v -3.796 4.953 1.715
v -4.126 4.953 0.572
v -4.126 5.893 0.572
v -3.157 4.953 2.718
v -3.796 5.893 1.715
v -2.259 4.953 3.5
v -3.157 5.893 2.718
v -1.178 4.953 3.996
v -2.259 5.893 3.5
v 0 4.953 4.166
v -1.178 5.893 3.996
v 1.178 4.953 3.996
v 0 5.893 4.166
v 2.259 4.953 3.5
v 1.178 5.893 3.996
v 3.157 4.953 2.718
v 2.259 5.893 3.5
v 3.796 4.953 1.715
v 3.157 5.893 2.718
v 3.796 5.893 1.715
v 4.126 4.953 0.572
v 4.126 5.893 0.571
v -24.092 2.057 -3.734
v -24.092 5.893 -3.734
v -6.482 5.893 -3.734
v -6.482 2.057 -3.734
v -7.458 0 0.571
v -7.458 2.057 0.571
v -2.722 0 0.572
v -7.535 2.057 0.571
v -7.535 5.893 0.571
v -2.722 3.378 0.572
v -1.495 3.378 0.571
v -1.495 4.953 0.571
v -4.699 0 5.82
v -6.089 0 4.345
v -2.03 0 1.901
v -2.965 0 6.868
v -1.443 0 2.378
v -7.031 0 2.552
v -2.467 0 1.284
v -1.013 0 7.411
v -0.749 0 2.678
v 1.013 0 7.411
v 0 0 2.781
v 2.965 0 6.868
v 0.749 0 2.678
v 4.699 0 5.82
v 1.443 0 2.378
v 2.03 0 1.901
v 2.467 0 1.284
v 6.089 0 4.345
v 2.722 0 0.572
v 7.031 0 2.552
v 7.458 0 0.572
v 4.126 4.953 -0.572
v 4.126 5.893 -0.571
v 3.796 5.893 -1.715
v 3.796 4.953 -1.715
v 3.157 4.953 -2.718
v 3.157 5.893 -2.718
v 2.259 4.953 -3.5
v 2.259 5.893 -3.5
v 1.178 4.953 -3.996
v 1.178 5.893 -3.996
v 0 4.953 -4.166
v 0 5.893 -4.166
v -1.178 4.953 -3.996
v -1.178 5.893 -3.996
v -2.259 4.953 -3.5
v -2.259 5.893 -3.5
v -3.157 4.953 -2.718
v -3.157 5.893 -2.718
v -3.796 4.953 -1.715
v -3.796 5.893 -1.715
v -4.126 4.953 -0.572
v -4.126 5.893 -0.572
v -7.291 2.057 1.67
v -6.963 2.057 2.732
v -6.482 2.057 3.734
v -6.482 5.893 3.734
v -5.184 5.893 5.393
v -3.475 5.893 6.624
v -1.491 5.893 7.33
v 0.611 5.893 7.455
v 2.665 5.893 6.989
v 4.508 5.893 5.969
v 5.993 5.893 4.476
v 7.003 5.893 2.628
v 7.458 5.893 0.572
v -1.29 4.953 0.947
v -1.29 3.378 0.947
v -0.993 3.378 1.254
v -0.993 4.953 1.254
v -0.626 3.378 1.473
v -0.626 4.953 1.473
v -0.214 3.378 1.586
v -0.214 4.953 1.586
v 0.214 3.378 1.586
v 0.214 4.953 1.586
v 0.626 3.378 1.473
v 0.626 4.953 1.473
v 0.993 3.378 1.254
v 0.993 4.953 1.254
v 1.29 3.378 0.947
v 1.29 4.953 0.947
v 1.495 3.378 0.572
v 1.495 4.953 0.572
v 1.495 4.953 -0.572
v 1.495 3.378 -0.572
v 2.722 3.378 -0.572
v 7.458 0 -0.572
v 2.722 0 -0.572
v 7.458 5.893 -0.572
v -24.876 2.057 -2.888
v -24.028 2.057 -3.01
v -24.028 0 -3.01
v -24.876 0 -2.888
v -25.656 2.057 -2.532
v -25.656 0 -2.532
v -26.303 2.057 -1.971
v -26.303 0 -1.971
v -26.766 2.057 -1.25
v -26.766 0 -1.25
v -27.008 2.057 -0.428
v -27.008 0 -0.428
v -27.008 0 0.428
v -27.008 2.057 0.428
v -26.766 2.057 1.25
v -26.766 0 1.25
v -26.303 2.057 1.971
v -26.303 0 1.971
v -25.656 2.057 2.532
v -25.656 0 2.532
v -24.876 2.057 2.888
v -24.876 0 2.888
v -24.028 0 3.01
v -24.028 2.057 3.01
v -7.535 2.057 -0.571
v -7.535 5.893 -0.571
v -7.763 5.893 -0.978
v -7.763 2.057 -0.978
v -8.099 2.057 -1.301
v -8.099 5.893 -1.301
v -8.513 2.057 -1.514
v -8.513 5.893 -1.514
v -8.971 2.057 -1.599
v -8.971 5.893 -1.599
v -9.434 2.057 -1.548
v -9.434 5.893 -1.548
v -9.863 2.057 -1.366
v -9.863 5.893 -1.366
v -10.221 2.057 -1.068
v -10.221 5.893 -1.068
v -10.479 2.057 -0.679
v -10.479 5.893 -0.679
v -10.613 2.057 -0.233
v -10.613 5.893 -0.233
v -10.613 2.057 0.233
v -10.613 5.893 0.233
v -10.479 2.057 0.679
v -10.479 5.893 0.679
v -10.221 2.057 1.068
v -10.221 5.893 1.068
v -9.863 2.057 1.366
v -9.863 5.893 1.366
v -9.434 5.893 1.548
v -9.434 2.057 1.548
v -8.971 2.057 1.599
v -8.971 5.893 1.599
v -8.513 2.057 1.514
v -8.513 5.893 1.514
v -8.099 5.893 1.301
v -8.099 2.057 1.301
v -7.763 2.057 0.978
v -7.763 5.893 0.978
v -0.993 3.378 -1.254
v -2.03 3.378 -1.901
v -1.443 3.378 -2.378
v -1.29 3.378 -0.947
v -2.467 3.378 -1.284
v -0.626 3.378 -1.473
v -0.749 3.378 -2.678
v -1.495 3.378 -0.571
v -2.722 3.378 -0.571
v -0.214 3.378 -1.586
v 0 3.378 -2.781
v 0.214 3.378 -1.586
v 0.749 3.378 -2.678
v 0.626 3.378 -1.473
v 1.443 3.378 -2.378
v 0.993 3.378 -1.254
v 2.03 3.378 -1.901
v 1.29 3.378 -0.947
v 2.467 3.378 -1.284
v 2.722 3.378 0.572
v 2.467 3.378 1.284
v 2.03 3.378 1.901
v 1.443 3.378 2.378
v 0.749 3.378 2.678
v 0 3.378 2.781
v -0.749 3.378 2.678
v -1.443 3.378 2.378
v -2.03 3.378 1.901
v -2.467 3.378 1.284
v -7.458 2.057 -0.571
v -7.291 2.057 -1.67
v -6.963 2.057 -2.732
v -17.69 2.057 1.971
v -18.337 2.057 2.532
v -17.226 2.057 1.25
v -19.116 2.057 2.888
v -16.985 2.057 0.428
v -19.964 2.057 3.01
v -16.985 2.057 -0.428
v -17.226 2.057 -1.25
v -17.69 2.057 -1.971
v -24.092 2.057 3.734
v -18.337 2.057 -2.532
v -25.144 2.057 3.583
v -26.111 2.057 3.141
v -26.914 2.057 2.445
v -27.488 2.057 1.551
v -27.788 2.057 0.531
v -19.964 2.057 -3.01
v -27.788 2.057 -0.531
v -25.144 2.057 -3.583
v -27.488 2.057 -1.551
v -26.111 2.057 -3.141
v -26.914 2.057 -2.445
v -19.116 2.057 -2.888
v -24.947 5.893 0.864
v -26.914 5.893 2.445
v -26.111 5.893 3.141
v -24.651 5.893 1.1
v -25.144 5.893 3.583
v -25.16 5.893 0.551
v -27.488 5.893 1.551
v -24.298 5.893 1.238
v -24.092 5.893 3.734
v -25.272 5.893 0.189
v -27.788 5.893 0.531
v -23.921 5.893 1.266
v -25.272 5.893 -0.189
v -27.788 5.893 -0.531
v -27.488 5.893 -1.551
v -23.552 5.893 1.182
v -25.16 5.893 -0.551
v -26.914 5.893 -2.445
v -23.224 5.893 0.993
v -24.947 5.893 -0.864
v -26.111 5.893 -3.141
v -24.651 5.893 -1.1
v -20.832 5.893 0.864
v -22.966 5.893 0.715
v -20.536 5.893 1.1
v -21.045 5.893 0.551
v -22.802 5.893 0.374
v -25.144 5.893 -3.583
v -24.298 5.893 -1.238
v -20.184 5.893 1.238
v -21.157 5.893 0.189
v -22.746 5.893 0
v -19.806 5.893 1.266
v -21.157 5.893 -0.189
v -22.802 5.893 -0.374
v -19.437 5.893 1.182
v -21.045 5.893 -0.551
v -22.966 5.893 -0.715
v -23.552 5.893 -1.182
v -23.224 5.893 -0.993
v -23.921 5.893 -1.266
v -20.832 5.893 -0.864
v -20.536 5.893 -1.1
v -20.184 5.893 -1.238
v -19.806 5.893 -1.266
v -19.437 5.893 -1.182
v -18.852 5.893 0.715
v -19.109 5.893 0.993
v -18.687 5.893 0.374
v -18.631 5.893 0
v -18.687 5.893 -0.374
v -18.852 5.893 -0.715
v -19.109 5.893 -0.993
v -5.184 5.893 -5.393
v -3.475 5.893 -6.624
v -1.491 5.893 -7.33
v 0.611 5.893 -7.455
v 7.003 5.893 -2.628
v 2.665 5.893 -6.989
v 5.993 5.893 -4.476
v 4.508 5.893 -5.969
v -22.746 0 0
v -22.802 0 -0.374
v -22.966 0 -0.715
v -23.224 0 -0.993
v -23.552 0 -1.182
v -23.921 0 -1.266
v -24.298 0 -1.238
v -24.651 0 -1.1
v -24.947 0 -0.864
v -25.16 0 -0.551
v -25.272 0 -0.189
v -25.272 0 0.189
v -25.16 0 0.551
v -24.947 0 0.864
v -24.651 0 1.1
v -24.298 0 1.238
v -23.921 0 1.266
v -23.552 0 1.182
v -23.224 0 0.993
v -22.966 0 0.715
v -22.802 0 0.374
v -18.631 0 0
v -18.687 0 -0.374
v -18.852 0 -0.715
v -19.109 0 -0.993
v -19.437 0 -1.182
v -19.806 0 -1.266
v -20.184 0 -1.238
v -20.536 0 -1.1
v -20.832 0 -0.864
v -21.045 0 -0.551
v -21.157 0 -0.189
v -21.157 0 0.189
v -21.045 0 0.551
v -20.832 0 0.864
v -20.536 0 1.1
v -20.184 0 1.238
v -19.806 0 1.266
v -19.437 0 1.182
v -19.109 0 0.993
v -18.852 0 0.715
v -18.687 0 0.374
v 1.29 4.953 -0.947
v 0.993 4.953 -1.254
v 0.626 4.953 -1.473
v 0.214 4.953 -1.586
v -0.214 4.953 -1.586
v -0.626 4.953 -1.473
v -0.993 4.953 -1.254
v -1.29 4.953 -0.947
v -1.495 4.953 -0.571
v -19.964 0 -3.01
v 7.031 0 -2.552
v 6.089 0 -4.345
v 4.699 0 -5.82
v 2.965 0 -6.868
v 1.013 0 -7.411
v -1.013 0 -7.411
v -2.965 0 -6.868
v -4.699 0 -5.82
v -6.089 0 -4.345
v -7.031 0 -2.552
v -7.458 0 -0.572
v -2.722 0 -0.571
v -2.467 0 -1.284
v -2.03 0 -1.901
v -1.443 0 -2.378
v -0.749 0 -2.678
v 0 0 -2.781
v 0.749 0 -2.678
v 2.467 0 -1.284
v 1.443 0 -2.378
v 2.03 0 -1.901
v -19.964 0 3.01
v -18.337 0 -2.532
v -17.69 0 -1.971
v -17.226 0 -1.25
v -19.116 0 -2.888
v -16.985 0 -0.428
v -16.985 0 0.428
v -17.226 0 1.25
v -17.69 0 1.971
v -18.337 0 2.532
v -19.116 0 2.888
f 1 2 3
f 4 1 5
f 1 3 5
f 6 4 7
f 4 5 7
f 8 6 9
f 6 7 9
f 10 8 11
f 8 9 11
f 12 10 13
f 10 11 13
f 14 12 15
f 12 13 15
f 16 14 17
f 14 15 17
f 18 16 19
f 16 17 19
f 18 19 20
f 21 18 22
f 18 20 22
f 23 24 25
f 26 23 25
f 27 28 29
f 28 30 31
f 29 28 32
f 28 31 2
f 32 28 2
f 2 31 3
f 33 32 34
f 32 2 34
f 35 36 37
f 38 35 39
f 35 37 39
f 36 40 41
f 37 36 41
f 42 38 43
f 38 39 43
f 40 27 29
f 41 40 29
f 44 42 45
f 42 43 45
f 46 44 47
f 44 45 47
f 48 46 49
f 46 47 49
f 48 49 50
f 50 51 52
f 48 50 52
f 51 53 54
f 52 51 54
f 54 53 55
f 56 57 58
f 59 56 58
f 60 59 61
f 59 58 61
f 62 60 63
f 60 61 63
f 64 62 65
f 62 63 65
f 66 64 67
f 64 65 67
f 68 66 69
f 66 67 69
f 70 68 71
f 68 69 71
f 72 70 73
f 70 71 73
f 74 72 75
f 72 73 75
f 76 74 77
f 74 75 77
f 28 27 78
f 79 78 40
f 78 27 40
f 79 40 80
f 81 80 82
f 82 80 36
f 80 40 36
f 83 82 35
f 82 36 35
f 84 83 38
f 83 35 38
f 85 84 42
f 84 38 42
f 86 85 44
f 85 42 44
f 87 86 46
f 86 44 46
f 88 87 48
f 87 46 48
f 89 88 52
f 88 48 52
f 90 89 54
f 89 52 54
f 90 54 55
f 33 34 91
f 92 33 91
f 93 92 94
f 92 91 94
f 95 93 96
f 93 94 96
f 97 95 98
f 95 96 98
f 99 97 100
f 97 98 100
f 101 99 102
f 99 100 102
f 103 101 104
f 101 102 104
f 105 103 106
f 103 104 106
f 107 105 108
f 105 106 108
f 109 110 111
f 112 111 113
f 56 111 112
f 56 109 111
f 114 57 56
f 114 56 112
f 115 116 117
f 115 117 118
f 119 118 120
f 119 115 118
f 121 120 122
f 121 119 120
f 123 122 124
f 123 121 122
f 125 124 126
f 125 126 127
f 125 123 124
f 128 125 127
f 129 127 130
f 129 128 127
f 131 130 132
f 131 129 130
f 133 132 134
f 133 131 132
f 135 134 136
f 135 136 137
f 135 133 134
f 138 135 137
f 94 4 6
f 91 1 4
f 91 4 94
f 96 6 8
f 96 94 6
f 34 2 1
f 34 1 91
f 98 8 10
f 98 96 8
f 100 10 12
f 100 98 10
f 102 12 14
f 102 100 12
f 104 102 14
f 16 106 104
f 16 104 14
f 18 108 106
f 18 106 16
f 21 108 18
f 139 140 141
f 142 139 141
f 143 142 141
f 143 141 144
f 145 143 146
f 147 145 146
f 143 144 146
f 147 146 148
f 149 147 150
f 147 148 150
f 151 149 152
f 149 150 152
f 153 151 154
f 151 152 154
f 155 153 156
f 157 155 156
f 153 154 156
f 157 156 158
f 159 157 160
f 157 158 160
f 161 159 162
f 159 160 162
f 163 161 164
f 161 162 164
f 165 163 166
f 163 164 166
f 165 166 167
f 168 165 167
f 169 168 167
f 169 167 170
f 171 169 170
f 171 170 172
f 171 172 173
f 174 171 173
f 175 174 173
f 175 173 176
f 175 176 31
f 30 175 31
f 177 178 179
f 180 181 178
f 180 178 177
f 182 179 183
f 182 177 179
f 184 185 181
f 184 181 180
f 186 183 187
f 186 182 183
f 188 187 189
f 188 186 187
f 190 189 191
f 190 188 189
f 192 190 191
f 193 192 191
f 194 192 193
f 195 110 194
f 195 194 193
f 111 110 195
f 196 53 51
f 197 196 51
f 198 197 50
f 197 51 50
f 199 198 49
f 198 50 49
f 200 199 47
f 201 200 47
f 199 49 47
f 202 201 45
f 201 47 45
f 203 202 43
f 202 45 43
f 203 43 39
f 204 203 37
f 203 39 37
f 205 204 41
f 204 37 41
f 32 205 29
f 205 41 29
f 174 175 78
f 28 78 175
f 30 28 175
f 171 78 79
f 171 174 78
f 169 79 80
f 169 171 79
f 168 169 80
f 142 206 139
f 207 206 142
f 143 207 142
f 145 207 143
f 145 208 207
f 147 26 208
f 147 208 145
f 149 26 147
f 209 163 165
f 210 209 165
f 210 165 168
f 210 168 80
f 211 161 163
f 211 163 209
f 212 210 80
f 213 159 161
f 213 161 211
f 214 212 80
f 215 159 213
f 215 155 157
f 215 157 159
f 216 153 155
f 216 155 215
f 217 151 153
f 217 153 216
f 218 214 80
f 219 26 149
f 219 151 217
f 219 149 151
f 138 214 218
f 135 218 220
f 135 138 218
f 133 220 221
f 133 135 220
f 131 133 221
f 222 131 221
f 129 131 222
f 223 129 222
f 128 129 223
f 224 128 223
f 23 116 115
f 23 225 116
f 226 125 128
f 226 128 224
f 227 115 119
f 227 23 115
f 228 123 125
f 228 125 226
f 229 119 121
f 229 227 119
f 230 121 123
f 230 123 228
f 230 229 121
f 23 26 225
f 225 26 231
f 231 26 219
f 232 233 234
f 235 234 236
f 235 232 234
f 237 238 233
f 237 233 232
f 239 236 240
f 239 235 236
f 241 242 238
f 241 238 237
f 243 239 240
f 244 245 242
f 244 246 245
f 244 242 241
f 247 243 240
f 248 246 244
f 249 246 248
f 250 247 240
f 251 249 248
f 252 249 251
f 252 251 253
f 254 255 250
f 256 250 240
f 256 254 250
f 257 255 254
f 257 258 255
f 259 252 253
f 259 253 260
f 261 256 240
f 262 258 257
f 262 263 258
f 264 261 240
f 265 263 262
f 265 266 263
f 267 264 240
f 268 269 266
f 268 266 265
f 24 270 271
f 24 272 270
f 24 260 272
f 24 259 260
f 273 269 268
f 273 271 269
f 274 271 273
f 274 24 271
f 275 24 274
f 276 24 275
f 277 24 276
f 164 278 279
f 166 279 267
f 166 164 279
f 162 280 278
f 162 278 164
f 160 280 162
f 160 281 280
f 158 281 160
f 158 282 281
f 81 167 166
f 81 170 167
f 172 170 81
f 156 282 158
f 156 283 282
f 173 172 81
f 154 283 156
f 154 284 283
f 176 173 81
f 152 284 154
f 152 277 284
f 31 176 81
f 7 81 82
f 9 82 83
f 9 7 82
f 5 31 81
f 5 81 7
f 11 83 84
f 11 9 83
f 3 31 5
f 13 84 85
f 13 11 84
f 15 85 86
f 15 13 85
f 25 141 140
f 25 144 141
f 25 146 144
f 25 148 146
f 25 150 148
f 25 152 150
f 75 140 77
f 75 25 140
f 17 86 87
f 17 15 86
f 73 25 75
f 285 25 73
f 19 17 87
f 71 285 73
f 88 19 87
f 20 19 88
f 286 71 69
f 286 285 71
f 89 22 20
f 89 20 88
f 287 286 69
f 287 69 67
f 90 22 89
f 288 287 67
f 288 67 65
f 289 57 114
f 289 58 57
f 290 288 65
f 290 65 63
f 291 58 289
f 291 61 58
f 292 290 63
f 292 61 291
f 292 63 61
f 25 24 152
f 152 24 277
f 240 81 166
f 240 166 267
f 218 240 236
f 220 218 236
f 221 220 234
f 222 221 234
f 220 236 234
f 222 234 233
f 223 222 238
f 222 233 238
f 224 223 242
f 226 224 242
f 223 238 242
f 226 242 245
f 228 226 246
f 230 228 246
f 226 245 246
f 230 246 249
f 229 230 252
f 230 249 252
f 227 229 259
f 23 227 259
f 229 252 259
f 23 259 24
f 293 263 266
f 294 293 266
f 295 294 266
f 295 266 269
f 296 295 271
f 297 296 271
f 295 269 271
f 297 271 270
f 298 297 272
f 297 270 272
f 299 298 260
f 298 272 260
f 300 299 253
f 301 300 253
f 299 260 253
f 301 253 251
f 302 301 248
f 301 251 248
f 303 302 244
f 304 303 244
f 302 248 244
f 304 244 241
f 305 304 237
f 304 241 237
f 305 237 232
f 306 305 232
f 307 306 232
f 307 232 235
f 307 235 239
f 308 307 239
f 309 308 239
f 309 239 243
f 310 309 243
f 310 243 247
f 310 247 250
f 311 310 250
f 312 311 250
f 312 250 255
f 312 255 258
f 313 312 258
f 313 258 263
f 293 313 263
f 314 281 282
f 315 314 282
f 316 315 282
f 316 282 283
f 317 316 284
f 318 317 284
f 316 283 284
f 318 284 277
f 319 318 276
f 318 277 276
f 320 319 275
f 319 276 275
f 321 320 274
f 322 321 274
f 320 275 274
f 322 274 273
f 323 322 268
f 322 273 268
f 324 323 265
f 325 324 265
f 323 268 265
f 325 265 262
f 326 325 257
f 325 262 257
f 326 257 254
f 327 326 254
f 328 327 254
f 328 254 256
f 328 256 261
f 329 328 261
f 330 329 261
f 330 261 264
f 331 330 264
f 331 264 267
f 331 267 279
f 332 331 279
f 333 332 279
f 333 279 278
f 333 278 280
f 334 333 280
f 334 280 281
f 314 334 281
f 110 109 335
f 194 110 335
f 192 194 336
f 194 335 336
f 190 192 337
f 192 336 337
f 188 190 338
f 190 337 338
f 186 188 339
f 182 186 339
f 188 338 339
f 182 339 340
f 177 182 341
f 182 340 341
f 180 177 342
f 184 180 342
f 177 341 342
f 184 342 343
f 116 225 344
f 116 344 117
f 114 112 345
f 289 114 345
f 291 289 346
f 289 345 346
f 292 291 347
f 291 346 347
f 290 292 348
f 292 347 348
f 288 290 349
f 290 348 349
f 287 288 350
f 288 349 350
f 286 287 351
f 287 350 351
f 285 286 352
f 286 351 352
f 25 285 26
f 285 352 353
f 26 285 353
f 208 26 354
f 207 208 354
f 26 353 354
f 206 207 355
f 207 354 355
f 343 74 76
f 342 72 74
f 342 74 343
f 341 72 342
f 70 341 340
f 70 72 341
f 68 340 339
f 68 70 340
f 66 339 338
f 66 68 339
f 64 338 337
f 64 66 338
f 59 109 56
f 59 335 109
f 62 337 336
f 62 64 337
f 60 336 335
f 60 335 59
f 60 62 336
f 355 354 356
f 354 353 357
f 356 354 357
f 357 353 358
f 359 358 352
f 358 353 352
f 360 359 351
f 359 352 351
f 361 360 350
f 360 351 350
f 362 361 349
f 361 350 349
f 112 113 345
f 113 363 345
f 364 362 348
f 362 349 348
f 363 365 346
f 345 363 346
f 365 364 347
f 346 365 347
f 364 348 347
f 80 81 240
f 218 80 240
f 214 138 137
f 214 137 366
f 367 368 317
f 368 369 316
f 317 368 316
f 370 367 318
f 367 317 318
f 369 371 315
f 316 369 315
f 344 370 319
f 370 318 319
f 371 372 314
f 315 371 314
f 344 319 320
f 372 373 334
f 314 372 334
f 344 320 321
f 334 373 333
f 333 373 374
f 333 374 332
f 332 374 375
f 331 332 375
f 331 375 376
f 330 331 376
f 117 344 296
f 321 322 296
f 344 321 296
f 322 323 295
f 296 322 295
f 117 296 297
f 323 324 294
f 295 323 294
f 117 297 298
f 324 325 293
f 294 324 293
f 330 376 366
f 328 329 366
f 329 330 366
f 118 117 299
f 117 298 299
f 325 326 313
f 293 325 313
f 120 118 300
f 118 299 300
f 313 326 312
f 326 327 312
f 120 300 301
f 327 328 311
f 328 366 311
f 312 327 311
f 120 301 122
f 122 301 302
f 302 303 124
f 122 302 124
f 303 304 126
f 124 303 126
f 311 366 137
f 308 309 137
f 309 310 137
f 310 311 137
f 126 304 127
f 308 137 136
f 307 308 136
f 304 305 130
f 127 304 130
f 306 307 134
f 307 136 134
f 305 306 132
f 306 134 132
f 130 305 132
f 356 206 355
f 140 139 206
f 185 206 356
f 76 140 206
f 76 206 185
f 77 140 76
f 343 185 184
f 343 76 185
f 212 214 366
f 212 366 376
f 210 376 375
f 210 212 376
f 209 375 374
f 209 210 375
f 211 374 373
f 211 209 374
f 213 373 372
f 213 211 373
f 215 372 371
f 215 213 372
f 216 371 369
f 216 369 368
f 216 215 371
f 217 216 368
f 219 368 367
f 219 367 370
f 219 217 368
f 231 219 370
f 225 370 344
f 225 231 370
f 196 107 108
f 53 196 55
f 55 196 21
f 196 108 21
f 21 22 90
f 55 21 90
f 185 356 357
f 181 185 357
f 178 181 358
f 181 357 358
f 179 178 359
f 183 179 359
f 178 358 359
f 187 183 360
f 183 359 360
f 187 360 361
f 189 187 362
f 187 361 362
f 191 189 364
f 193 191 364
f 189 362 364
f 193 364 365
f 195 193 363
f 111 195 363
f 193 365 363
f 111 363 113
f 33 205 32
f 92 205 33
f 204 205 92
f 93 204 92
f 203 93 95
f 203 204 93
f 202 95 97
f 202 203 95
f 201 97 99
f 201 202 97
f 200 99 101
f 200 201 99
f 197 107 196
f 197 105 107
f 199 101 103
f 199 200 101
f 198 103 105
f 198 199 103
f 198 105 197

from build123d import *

# Parameters (mm, degrees)
SKETCH1_R           = 7.4803
BOSS_EXTRUDE1_DEPTH = 5.8928
SKETCH2_R           = 2.7813
CUT_EXTRUDE1_DEPTH  = 3.3782
BOSS_EXTRUDE2_DEPTH = 3.8354
BOSS_EXTRUDE3_DEPTH = 2.0574
SKETCH6_R           = 4.1656
CUT_EXTRUDE2_DEPTH  = 0.9398
SKETCH7_R           = 1.6002
SKETCH7_R_2         = 1.27
SKETCH7_W           = 18.255027212
SKETCH7_H           = 1.143
CUT_EXTRUDE3_DEPTH  = 6.8928


with BuildPart() as part:
    # Sketch1 → Boss-Extrude1 (new body)
    with BuildSketch(Plane(origin=(0, 0, 0), x_dir=(1, 0, 0), z_dir=(0, 1, 0))):
        Circle(SKETCH1_R)
    extrude(amount=BOSS_EXTRUDE1_DEPTH)

    # Sketch2 → Cut-Extrude1 (cut)
    with BuildSketch(Plane.XZ):
        Circle(SKETCH2_R)
    extrude(amount=-CUT_EXTRUDE1_DEPTH, mode=Mode.SUBTRACT)

    # Sketch4 → Boss-Extrude2 (add)
    with BuildSketch(Plane(origin=(0, 5.8928, 0), x_dir=(1, 0, 0), z_dir=(0, 1, 0))):
        with BuildLine():
            Line((-24.0919, 3.7338), (-6.481791855, 3.7338))
            ThreePointArc((-6.481791855, 3.7338), (-7.4803, 0), (-6.481791855, -3.7338))
            Line((-6.481791855, -3.7338), (-24.0919, -3.7338))
            ThreePointArc((-24.0919, -3.7338), (-27.8257, 0), (-24.0919, 3.7338))
        make_face()
    extrude(amount=-BOSS_EXTRUDE2_DEPTH)

    # Sketch5 → Boss-Extrude3 (add)
    with BuildSketch(Plane.XZ.offset(-2.0574)):
        with BuildLine():
            Line((-24.0284, 3.0099), (-19.9644, 3.0099))
            ThreePointArc((-19.9644, 3.0099), (-16.9545, 0), (-19.9644, -3.0099))
            Line((-19.9644, -3.0099), (-24.0284, -3.0099))
            ThreePointArc((-24.0284, -3.0099), (-27.0383, 0), (-24.0284, 3.0099))
        make_face()
    extrude(amount=BOSS_EXTRUDE3_DEPTH)

    # Sketch6 → Cut-Extrude2 (cut)
    with BuildSketch(Plane(origin=(0, 5.8928, 0), x_dir=(1, 0, 0), z_dir=(0, 1, 0))):
        Circle(SKETCH6_R)
    extrude(amount=-CUT_EXTRUDE2_DEPTH, mode=Mode.SUBTRACT)

    # Sketch7 → Cut-Extrude3 (cut, through all)
    with BuildSketch(Plane(origin=(0, 5.8928, 0), x_dir=(1, 0, 0), z_dir=(0, 1, 0))):
        with Locations((-9.0297, 0)):
            Circle(SKETCH7_R)
        Circle(SKETCH7_R)
        with Locations((-24.0157, 0)):
            Circle(SKETCH7_R_2)
        with Locations((-19.9009, 0)):
            Circle(SKETCH7_R_2)
        with Locations((0.097813606, 0)):
            Rectangle(SKETCH7_W, SKETCH7_H)
    extrude(amount=-CUT_EXTRUDE3_DEPTH, mode=Mode.SUBTRACT)


solid = part.part
